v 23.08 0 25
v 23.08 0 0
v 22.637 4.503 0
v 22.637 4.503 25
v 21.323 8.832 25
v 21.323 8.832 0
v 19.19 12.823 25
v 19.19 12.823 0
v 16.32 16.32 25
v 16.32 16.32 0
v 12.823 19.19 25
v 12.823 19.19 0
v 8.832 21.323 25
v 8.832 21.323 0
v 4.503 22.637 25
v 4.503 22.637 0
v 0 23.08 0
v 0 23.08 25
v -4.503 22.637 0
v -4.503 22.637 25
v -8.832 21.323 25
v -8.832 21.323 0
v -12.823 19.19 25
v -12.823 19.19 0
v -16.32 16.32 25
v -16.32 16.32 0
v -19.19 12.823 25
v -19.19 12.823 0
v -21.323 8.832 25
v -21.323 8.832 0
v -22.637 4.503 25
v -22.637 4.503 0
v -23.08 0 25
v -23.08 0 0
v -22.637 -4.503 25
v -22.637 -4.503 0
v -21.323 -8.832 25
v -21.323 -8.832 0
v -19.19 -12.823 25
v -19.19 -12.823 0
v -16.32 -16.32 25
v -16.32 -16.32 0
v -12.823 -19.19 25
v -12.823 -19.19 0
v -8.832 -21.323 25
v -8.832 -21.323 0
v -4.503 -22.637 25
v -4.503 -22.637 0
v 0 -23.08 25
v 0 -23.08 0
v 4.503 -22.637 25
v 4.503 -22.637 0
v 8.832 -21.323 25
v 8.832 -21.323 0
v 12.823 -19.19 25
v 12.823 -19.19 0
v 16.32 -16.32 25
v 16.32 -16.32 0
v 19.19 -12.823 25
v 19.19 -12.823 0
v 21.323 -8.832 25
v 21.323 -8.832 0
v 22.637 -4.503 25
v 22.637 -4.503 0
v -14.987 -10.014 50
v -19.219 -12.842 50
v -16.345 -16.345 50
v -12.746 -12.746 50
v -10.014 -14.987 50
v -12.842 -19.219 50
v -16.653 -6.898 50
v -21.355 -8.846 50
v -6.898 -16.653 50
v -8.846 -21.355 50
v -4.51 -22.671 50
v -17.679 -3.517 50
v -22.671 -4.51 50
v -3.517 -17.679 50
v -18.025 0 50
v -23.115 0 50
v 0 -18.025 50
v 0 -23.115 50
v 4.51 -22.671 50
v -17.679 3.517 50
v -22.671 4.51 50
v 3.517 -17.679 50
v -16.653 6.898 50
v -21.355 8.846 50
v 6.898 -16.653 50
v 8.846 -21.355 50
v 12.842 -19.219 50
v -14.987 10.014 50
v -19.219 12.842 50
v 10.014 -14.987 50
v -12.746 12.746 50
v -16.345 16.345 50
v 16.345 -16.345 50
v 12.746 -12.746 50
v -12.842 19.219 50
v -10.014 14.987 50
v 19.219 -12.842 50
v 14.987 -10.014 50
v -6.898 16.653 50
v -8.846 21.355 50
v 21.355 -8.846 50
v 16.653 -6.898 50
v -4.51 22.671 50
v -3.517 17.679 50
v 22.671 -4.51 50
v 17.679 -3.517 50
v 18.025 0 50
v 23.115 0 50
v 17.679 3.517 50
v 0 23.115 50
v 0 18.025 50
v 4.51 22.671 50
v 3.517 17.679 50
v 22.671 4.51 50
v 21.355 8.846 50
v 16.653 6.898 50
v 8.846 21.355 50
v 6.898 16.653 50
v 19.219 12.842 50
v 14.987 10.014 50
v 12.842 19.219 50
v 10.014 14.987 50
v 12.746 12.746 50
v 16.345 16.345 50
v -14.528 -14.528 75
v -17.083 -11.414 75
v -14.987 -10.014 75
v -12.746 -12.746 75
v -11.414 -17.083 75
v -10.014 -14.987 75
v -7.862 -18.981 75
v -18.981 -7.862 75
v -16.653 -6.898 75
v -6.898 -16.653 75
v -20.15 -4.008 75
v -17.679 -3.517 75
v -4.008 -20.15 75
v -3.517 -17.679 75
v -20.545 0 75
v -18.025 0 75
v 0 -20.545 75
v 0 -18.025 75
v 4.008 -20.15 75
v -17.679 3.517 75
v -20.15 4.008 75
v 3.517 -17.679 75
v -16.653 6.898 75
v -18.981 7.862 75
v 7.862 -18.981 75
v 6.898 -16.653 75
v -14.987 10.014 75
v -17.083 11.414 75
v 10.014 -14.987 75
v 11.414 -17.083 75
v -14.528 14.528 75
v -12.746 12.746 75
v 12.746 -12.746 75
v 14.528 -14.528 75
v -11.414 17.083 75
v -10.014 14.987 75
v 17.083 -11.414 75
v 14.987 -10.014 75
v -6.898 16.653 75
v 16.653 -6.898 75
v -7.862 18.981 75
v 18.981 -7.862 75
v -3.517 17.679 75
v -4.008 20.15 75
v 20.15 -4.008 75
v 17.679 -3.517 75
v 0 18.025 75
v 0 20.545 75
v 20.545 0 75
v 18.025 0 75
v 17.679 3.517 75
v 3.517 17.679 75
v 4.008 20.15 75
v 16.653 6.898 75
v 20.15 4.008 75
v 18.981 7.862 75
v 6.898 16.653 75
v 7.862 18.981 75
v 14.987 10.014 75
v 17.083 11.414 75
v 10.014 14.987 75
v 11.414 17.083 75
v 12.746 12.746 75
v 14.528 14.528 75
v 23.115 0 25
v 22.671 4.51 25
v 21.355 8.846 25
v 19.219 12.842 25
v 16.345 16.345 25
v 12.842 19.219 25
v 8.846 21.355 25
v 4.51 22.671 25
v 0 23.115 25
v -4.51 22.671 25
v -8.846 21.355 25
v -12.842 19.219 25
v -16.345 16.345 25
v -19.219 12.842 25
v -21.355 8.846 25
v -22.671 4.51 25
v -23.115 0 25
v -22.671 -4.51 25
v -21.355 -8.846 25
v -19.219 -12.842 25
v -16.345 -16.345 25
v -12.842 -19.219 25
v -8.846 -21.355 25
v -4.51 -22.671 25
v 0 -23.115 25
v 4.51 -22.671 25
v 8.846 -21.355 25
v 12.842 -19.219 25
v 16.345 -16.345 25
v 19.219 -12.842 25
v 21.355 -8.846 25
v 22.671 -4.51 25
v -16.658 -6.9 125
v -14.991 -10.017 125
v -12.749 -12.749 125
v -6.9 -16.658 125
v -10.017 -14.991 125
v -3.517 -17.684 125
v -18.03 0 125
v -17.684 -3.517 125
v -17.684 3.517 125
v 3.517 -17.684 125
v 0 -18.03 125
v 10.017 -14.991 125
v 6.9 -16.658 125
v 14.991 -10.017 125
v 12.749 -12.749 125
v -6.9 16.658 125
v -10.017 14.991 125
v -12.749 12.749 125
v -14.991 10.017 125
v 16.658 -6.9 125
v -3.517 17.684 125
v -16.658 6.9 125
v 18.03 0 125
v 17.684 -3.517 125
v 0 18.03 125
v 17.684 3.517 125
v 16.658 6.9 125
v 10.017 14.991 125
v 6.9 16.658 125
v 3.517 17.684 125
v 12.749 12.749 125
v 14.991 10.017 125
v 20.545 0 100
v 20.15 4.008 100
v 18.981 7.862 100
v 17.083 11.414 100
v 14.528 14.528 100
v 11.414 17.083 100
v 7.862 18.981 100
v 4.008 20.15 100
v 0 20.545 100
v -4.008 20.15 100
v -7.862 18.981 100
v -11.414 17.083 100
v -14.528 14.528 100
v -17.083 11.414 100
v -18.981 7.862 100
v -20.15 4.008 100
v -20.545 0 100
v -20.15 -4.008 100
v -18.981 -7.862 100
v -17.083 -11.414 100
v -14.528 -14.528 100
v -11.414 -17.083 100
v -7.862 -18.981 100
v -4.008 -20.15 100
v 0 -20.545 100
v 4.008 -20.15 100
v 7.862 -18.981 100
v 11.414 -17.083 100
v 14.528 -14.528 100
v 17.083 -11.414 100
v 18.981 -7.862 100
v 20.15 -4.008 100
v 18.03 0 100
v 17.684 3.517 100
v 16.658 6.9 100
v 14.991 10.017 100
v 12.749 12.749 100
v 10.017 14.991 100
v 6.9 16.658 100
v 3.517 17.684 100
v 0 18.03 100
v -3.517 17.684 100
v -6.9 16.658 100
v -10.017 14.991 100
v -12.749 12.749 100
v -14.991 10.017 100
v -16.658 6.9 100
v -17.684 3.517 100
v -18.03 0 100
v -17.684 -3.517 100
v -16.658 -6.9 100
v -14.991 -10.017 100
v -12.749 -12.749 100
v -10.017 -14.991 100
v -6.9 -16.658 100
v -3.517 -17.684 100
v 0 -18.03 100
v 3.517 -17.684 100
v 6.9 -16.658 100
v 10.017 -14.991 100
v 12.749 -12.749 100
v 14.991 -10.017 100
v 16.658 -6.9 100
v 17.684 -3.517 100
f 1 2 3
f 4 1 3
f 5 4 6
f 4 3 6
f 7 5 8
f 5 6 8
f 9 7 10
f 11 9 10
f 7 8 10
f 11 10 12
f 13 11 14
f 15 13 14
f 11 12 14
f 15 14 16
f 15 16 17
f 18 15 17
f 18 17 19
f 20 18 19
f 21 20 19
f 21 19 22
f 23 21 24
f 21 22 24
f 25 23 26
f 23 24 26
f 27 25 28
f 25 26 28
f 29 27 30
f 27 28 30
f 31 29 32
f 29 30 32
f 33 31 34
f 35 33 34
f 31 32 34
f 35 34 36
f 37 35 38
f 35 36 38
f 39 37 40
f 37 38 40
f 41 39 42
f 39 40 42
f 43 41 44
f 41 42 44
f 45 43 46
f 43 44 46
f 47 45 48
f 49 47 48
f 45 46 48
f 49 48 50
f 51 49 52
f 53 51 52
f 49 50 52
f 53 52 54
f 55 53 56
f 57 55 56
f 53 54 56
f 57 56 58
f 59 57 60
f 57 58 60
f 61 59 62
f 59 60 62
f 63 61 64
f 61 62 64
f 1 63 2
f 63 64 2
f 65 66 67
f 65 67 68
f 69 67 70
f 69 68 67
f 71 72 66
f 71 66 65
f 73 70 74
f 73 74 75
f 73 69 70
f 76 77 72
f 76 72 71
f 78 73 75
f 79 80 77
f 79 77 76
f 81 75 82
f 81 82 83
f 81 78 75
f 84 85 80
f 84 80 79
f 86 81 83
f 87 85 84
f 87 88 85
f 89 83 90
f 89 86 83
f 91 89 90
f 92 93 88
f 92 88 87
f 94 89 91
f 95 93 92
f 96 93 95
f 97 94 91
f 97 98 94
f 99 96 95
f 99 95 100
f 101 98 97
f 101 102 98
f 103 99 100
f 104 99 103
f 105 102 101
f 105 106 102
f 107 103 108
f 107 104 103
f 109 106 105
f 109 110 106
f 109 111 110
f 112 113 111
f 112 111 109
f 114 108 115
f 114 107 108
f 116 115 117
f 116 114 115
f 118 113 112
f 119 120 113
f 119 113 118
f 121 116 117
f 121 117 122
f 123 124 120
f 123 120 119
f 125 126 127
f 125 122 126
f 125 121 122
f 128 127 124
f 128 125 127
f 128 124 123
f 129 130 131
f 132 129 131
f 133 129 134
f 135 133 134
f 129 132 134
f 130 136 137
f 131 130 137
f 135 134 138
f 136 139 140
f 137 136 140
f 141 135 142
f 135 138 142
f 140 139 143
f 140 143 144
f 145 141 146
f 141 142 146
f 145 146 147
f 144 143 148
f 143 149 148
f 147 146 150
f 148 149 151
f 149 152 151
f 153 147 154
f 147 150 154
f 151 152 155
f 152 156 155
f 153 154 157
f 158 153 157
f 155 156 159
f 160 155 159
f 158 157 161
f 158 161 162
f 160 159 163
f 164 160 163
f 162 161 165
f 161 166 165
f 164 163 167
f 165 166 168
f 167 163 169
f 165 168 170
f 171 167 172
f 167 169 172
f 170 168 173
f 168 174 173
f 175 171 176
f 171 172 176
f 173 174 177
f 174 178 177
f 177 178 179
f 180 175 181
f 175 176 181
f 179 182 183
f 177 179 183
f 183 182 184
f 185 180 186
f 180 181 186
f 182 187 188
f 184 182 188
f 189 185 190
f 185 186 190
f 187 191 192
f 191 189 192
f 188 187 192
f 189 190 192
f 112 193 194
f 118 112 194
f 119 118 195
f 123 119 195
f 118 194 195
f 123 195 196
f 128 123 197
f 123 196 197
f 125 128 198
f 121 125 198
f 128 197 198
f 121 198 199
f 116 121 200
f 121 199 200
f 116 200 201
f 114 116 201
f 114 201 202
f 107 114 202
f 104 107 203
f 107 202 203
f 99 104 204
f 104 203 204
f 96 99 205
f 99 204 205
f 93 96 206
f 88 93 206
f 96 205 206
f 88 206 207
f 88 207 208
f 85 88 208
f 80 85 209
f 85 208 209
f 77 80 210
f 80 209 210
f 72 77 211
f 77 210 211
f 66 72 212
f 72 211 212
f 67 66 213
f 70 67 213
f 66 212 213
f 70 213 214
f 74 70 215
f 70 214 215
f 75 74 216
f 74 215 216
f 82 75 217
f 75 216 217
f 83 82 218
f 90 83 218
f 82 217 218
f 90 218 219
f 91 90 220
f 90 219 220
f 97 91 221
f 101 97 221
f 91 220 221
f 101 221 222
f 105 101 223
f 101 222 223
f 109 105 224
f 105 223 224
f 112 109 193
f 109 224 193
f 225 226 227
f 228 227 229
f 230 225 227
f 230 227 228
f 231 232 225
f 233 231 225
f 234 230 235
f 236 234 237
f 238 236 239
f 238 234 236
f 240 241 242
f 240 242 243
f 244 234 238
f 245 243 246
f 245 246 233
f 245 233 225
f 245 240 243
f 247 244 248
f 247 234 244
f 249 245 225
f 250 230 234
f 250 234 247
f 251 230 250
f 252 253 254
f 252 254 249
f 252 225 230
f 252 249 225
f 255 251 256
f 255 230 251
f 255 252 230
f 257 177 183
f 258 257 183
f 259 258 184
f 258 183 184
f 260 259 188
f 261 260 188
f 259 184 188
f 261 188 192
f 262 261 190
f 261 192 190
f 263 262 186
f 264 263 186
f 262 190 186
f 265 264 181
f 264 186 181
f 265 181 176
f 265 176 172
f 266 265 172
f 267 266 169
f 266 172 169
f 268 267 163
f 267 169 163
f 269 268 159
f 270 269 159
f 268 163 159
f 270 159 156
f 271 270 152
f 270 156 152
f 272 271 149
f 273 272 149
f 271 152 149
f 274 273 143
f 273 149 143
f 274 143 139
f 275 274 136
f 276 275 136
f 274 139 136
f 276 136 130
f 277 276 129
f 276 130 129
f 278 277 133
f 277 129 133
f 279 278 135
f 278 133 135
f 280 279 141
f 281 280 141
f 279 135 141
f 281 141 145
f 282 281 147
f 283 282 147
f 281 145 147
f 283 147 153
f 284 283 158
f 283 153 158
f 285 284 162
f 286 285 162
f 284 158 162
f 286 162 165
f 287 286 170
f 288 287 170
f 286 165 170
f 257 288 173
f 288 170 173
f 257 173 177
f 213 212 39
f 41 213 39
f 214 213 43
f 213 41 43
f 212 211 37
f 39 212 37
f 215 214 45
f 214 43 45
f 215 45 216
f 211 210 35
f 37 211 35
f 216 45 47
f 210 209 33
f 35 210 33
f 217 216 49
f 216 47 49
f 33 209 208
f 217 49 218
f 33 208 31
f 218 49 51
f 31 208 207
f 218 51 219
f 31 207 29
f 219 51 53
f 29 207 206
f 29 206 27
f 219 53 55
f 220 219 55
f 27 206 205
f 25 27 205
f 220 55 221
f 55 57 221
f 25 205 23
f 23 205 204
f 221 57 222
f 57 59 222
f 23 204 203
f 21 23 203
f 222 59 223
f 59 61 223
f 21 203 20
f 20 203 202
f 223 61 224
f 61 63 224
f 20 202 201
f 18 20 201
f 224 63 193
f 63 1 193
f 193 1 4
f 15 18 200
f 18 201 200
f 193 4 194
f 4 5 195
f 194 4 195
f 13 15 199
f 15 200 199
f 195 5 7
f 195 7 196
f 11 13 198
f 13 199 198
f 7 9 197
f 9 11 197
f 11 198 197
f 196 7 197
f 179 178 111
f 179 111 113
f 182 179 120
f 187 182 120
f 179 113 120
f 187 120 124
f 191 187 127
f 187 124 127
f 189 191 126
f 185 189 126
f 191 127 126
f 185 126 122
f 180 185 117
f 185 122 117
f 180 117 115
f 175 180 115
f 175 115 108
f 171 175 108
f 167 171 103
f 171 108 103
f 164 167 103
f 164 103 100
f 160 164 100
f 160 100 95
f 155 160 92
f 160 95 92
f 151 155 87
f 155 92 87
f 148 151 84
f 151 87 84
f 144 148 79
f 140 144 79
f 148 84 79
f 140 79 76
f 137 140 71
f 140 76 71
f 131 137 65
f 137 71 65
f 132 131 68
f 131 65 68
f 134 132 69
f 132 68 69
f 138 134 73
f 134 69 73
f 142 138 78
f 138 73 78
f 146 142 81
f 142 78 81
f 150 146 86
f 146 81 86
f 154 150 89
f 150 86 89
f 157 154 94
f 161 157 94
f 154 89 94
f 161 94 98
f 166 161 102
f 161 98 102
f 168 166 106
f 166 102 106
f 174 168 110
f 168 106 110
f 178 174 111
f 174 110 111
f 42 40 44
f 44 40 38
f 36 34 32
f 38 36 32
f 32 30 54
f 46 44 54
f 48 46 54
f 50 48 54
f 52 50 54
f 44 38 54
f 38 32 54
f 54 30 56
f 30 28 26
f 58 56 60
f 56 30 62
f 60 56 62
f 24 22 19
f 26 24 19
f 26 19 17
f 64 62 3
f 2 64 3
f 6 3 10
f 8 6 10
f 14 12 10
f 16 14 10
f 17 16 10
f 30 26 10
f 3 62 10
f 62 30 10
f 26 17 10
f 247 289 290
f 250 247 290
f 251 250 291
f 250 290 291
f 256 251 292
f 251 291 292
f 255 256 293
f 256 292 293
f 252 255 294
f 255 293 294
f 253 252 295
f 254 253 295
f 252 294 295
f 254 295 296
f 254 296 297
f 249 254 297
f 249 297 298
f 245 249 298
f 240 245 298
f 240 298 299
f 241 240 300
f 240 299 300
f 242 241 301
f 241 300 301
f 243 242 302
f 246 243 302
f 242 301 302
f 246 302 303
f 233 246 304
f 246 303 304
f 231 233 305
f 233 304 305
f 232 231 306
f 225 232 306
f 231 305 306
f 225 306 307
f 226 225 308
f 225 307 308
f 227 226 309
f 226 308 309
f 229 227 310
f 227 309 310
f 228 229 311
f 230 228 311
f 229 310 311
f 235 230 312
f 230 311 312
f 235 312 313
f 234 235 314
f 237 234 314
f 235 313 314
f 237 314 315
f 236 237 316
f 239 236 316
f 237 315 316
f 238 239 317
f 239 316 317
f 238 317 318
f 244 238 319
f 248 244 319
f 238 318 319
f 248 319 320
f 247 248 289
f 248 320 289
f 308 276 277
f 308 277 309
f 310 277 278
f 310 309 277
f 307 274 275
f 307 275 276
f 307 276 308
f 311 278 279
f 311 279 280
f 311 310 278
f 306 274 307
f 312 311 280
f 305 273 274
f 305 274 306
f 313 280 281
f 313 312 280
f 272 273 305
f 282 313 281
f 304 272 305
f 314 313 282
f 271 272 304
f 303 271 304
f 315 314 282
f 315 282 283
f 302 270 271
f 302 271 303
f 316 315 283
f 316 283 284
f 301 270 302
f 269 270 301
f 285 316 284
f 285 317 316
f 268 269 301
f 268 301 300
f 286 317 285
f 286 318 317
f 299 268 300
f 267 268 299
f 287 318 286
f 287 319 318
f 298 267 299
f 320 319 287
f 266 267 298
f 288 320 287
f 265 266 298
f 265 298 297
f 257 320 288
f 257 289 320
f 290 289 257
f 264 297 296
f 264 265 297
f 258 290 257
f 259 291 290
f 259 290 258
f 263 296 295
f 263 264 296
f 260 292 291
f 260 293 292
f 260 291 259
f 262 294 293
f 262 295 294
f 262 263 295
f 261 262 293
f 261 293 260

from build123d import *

# Parameters (mm, degrees)
F0_R     = 23.08
F1_DEPTH = 25
F2_R     = 23.115
F3_DEPTH = 25
F4_R     = 18.025
F5_DEPTH = 25
F6_R     = 20.545
F7_DEPTH = 25
F8_R     = 18.03
F9_DEPTH = 25


with BuildPart() as f1:
    # F0 (on Top) → F1 (new body)
    with BuildSketch(Plane.XY):
        Circle(F0_R)
    extrude(amount=F1_DEPTH)

    # F2 (on face) → F3 (join)
    with BuildSketch(Plane.XY.offset(25)):
        Circle(F2_R)
    extrude(amount=F3_DEPTH)

    # F4 (on face) → F5 (join)
    with BuildSketch(Plane.XY.offset(50)):
        Circle(F4_R)
    extrude(amount=F5_DEPTH)

    # F6 (on face) → F7 (join)
    with BuildSketch(Plane.XY.offset(75)):
        Circle(F6_R)
    extrude(amount=F7_DEPTH)

    # F8 (on face) → F9 (join)
    with BuildSketch(Plane.XY.offset(100)):
        Circle(F8_R)
    extrude(amount=F9_DEPTH)


solid = f1.part
